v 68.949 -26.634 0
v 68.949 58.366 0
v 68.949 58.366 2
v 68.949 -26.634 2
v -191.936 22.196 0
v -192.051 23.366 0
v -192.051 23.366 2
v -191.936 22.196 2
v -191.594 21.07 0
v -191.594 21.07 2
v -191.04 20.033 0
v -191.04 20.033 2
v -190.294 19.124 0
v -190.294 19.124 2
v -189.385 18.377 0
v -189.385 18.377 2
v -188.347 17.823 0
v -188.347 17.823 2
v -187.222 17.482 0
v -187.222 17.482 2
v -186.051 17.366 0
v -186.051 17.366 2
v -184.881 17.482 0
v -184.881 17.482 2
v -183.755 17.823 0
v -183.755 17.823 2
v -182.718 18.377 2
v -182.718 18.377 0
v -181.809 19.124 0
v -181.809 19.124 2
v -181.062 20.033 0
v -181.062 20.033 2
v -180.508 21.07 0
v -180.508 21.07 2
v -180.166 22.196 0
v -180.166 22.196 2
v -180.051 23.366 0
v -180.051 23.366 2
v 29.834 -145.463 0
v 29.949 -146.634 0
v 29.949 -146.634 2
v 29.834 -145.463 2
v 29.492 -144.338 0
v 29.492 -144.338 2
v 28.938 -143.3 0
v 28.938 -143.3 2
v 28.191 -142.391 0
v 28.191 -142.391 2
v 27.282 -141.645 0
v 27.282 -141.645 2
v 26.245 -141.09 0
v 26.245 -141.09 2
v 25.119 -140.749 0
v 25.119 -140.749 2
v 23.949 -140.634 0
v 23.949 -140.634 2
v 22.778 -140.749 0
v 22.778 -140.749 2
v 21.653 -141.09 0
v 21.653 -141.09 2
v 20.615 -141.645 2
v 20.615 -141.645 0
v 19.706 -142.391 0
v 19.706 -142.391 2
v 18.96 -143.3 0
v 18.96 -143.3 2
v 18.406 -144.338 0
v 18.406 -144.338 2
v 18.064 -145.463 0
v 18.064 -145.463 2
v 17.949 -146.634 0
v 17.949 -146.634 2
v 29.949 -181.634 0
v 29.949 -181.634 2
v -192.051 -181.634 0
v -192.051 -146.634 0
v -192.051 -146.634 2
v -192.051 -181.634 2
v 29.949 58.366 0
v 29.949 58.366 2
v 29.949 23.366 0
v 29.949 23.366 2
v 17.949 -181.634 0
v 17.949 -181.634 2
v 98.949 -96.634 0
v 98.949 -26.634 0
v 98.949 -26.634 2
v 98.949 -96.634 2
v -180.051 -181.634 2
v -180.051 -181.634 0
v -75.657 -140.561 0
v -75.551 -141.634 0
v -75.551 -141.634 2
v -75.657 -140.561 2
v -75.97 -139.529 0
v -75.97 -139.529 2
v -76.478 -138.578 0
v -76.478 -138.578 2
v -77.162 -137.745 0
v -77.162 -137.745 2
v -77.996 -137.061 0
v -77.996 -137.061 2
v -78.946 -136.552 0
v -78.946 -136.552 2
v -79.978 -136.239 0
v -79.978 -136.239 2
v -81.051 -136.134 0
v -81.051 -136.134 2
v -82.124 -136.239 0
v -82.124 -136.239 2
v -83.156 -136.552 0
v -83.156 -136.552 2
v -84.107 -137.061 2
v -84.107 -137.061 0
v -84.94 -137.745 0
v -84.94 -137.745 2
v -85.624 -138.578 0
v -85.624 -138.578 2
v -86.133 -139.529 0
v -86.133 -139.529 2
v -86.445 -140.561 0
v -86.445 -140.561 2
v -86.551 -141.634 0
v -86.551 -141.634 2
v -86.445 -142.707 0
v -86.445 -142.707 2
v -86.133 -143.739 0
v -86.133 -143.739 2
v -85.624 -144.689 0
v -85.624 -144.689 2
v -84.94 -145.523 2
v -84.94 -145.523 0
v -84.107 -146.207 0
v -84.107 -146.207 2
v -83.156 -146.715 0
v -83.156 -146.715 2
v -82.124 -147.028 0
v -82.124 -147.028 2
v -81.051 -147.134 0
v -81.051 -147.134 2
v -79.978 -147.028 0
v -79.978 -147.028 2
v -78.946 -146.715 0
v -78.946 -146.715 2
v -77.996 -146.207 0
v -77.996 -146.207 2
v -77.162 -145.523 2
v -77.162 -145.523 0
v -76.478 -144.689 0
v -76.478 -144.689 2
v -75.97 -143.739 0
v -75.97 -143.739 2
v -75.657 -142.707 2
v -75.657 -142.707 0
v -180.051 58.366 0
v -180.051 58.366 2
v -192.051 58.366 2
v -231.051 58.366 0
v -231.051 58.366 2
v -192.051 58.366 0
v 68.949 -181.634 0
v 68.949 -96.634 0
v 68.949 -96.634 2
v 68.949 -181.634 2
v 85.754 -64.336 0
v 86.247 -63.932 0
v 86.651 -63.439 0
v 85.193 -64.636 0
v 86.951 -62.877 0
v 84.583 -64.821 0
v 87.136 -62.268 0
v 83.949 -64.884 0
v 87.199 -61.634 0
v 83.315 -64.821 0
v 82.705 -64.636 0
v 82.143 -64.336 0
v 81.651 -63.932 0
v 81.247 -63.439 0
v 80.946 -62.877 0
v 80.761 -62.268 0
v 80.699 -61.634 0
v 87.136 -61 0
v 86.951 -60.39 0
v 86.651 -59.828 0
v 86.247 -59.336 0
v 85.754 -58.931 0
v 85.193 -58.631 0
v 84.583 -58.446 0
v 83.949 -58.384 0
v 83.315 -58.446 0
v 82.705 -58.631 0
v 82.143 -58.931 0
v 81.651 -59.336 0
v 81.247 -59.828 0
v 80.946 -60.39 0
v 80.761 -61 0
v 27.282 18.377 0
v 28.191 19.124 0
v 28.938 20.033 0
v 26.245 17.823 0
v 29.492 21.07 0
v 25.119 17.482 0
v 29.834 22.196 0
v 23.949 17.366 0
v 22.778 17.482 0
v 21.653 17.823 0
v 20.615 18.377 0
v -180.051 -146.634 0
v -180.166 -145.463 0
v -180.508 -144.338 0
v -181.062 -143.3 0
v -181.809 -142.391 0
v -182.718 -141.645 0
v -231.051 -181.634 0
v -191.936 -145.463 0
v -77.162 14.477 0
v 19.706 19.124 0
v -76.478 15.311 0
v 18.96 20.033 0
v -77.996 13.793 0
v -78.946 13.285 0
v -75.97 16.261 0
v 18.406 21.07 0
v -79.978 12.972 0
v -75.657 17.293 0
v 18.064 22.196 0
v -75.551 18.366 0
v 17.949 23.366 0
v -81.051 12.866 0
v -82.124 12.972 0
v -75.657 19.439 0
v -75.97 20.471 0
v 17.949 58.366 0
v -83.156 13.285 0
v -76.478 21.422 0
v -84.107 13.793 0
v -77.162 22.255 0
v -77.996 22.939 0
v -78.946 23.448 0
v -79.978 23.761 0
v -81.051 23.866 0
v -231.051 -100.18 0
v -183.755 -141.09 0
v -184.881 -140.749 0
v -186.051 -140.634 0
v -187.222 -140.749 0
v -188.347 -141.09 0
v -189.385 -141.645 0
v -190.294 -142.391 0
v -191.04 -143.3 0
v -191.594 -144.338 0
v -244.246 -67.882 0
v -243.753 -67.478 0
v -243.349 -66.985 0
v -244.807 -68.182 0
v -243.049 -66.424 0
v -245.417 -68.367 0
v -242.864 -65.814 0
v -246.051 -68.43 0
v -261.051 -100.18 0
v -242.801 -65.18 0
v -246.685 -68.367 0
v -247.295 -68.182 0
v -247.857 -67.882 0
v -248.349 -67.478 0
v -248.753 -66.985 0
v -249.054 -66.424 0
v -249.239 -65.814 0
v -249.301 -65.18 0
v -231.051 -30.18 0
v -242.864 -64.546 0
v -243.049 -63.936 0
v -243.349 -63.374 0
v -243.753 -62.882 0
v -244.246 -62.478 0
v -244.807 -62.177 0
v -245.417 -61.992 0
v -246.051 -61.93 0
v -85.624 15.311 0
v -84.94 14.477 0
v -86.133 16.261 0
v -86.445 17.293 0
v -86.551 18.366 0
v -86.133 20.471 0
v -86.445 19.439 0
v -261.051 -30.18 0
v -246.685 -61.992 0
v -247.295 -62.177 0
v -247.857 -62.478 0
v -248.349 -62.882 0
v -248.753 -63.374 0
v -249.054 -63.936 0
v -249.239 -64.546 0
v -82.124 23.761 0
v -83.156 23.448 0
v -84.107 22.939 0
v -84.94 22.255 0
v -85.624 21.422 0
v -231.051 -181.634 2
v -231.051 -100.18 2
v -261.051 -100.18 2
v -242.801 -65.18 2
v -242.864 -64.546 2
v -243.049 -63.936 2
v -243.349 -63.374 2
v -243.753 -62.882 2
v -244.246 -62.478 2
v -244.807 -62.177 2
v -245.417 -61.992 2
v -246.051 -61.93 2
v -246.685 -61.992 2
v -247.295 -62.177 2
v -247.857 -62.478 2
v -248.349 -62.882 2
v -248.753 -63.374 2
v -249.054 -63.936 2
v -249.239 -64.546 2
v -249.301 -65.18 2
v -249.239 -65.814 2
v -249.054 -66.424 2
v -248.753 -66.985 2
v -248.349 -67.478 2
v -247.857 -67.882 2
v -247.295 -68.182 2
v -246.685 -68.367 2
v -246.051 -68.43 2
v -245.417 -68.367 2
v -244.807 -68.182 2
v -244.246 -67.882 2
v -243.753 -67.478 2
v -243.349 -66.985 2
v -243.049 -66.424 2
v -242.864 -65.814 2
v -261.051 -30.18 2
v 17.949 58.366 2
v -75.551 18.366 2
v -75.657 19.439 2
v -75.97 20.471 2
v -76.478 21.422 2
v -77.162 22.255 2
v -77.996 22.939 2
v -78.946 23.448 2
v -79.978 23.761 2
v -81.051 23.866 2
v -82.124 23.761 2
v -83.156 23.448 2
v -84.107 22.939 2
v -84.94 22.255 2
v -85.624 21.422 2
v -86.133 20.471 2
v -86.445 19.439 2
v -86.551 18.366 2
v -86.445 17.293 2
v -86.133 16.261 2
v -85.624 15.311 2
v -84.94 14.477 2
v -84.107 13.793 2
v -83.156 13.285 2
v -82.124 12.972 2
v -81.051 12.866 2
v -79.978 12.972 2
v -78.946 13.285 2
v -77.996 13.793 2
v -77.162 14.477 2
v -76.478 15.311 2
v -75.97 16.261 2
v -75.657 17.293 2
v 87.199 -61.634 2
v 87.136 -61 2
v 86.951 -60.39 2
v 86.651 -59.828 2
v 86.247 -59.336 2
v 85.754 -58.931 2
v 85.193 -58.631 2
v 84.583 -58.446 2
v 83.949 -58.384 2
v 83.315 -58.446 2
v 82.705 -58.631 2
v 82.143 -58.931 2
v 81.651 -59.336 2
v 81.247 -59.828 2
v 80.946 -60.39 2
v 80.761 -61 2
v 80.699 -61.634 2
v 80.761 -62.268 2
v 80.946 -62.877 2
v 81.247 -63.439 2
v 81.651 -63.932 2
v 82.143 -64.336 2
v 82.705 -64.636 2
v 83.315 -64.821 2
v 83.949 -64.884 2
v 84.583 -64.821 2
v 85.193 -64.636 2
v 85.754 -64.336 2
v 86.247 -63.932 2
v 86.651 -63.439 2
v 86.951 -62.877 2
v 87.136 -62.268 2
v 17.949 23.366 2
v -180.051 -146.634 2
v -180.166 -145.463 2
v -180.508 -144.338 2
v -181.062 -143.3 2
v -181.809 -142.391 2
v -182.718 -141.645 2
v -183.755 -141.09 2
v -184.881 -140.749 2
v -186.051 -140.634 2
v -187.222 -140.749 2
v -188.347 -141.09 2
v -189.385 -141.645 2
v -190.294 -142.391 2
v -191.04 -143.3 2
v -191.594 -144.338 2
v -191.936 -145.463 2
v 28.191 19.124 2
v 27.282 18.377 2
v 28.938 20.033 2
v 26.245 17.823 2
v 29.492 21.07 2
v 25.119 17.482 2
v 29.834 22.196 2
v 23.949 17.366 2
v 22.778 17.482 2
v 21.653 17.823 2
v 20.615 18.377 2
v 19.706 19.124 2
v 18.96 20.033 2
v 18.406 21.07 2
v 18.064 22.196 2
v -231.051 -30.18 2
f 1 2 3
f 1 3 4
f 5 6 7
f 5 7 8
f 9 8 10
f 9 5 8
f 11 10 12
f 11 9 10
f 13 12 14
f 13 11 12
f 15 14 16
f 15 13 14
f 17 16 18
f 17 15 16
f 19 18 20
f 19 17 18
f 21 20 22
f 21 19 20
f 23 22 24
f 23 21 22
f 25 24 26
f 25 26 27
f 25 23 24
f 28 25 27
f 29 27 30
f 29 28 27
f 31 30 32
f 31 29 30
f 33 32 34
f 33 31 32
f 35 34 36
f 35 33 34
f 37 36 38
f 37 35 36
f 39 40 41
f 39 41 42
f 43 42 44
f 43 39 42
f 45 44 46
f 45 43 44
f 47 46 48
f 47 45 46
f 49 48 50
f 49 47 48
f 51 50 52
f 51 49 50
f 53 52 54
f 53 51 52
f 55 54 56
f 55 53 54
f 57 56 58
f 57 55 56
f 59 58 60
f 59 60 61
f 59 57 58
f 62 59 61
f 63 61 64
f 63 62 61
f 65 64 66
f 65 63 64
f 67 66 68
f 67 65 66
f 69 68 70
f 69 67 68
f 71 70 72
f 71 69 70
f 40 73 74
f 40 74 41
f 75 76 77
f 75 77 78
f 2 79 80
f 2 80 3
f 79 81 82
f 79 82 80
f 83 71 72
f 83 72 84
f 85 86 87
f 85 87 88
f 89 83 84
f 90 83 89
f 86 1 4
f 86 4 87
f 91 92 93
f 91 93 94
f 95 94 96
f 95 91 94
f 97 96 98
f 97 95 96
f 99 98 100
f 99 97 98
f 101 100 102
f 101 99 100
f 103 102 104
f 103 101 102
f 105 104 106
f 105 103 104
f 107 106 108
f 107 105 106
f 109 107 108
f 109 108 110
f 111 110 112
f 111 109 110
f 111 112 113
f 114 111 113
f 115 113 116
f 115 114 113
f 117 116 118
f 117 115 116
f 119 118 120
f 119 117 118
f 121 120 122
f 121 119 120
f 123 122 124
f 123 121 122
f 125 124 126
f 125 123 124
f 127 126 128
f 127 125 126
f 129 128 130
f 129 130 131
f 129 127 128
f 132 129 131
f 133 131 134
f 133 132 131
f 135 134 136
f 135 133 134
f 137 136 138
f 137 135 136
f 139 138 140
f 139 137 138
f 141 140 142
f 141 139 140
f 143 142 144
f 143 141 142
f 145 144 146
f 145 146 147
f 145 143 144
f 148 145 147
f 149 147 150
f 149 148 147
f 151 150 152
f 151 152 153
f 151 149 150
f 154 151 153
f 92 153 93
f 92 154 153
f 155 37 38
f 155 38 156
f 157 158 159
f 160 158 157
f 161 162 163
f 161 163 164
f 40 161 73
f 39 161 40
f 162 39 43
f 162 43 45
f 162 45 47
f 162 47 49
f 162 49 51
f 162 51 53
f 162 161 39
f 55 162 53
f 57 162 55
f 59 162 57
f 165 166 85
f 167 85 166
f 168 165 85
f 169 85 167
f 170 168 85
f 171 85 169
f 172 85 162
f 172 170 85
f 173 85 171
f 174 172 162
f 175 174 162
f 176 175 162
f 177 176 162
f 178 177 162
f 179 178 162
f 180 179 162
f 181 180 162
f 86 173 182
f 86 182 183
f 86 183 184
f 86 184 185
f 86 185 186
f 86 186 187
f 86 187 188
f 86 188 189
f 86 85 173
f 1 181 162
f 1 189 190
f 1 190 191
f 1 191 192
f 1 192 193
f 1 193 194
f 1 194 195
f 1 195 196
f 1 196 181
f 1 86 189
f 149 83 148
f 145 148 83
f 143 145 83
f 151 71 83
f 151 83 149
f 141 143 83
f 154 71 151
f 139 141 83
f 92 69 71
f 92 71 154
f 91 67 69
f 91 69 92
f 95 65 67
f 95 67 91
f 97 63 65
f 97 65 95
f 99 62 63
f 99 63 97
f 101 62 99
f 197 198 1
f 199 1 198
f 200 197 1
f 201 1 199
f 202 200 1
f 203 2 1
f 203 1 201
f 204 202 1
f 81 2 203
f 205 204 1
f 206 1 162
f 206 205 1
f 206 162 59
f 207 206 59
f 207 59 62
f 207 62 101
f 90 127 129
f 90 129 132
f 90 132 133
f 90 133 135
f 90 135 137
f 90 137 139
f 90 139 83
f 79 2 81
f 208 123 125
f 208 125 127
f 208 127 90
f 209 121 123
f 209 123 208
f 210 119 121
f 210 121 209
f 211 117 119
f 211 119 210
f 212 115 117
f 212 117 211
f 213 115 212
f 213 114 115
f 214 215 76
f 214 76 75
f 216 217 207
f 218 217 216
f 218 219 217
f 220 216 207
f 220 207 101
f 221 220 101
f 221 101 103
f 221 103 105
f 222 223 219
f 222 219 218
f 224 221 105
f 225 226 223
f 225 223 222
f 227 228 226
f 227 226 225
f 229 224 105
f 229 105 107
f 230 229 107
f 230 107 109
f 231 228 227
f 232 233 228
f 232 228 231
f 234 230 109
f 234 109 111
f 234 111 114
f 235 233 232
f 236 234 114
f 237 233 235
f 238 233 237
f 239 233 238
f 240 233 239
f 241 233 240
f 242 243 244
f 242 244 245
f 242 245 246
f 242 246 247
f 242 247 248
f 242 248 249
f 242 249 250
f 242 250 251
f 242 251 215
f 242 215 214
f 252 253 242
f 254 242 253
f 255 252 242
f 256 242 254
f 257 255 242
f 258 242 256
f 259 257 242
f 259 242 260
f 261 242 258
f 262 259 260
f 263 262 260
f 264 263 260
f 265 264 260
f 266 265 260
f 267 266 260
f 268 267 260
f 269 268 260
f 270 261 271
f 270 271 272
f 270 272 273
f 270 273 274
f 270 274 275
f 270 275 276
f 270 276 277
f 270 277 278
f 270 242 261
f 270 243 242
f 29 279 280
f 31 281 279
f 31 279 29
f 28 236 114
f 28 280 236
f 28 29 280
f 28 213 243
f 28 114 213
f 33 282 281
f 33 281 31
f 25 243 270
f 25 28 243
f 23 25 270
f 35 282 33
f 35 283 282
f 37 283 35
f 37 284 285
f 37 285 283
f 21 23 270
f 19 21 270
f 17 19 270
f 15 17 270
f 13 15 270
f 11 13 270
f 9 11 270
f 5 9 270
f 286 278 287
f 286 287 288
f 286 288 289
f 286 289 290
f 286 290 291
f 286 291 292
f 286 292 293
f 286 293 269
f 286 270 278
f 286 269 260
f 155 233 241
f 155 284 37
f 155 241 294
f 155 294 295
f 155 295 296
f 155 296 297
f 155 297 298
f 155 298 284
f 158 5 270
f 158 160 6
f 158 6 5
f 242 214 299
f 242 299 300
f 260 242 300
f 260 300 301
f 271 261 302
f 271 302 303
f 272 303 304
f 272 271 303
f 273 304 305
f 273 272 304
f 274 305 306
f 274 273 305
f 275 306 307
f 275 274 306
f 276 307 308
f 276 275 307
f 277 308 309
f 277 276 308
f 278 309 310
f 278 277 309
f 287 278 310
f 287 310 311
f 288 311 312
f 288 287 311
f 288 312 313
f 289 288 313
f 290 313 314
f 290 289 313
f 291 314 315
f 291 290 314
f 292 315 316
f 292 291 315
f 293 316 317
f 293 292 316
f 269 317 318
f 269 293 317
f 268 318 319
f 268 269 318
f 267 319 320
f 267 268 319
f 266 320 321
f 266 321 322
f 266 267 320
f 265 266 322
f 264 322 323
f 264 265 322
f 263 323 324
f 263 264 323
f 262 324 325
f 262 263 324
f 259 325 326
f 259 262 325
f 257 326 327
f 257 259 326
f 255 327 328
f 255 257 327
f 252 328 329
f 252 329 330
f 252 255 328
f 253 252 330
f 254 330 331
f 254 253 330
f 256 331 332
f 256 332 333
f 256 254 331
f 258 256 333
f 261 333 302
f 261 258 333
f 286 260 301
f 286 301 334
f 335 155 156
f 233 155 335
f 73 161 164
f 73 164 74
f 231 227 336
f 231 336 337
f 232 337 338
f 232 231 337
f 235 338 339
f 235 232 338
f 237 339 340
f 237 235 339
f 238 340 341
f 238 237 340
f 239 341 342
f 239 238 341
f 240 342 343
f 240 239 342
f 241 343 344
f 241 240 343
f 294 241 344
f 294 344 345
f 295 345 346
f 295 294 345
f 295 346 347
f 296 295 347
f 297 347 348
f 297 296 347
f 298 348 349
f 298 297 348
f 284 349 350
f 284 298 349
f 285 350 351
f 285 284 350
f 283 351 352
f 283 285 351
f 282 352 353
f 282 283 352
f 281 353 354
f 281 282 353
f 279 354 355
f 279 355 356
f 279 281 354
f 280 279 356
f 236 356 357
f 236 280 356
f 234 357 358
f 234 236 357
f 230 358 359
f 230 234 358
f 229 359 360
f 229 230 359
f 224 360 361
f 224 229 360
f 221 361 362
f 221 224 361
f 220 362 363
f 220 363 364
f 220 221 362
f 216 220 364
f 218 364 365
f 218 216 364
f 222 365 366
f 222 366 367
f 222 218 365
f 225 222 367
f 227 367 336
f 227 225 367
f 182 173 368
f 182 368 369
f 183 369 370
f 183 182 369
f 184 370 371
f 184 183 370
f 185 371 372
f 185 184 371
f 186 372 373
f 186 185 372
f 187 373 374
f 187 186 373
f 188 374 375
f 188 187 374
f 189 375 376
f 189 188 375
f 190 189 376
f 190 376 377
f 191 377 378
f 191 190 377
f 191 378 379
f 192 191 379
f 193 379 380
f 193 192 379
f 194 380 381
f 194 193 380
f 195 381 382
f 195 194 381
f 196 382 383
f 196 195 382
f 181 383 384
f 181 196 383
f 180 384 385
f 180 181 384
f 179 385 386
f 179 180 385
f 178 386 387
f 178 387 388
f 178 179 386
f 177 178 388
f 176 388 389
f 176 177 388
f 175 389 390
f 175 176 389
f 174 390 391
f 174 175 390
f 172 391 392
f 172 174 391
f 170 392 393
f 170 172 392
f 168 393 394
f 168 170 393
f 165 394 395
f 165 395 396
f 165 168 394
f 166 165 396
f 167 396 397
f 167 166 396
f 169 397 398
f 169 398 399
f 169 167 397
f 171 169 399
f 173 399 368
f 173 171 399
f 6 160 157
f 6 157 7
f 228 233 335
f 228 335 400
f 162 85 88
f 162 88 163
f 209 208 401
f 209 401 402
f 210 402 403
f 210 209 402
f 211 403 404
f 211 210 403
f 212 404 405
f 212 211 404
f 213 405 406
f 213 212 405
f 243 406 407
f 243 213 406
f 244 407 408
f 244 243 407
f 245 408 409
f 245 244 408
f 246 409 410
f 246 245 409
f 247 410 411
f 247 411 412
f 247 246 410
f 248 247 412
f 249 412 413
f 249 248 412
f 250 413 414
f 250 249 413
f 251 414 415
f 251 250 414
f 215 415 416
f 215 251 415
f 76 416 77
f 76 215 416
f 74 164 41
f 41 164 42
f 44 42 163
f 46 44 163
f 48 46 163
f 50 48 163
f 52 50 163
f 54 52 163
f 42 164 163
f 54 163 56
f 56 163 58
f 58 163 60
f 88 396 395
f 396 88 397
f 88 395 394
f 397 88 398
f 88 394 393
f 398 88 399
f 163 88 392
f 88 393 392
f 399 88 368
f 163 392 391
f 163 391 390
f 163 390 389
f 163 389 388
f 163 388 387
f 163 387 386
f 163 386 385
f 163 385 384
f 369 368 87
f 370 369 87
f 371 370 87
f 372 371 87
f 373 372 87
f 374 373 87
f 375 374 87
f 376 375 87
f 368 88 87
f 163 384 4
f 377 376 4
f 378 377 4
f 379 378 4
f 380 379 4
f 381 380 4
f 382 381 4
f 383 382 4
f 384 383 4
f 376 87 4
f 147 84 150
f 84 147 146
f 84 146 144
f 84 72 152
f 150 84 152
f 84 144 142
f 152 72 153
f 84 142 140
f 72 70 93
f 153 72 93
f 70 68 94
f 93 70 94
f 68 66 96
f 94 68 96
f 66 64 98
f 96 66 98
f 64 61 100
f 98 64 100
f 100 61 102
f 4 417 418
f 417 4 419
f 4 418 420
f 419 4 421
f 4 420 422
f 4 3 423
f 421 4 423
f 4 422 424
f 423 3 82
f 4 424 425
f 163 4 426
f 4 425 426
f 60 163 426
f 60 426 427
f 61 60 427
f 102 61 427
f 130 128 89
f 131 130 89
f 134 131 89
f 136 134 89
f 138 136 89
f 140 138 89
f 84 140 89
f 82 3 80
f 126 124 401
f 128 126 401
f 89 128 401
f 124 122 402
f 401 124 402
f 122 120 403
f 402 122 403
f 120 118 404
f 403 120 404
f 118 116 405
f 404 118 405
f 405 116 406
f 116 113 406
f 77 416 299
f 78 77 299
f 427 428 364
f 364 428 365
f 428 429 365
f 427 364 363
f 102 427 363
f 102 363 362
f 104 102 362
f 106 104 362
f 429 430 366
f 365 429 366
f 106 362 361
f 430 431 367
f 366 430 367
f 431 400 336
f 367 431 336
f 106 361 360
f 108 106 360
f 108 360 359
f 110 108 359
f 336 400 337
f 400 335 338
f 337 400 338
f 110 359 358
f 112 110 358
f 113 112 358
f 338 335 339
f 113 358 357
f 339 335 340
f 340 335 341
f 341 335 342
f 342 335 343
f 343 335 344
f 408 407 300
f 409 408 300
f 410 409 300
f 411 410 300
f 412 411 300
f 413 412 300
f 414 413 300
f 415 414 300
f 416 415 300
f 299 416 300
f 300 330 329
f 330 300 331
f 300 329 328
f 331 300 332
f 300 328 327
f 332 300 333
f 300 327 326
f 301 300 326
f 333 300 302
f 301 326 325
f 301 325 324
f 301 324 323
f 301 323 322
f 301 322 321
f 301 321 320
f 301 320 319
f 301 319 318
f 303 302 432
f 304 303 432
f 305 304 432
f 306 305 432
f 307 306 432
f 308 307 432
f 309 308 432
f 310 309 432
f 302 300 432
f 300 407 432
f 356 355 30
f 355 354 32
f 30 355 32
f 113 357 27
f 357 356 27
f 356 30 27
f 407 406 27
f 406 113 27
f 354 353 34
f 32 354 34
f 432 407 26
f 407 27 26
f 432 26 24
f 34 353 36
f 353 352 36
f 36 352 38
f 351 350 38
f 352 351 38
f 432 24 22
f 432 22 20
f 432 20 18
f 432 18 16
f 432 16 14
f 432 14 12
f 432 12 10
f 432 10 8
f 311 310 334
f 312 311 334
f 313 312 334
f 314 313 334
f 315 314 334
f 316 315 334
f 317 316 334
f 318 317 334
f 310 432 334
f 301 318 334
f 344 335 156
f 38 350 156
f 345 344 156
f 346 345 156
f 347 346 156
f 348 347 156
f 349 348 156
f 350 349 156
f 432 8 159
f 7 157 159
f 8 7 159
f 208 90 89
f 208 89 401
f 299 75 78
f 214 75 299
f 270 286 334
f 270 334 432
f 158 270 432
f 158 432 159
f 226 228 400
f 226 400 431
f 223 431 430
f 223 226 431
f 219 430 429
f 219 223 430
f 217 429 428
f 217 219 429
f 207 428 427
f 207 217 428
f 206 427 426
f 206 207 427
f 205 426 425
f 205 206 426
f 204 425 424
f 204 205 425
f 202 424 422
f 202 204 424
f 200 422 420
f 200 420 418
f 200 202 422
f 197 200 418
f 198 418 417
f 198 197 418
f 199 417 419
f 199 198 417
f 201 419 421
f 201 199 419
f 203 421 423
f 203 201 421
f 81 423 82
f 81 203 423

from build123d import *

# Parameters (mm, degrees)
SKETCH1_R           = 5.5
SKETCH1_R_2         = 3.25
BOSS_EXTRUDE1_DEPTH = 2


with BuildPart() as part:
    # Sketch1 → Boss-Extrude1 (new body)
    with BuildSketch(Plane.XY):
        with BuildLine():
            Line((68.948821818, -26.633764286), (98.948821818, -26.633764286))
            Line((98.948821818, -26.633764286), (98.948821818, -96.633764286))
            Line((98.948821818, -96.633764286), (68.948821818, -96.633764286))
            Line((68.948821818, -96.633764286), (68.948821818, -181.633764286))
            Line((68.948821818, -181.633764286), (29.948821818, -181.633764286))
            Line((29.948821818, -181.633764286), (29.948821818, -146.633764286))
            ThreePointArc((29.948821818, -146.633764286), (23.948821818, -140.633764286), (17.948821818, -146.633764286))
            Line((17.948821818, -146.633764286), (17.948821818, -181.633764286))
            Line((17.948821818, -181.633764286), (-180.051178182, -181.633764286))
            Line((-180.051178182, -181.633764286), (-180.051178182, -146.633764286))
            ThreePointArc((-180.051178182, -146.633764286), (-186.051178182, -140.633764286), (-192.051178182, -146.633764286))
            Line((-192.051178182, -146.633764286), (-192.051178182, -181.633764286))
            Line((-192.051178182, -181.633764286), (-231.051178182, -181.633764286))
            Line((-231.051178182, -181.633764286), (-231.051178182, -100.179856115))
            Line((-231.051178182, -100.179856115), (-261.051178182, -100.179856115))
            Line((-261.051178182, -100.179856115), (-261.051178182, -30.179856115))
            Line((-261.051178182, -30.179856115), (-231.051178182, -30.179856115))
            Line((-231.051178182, -30.179856115), (-231.051178182, 58.366235714))
            Line((-231.051178182, 58.366235714), (-192.051178182, 58.366235714))
            Line((-192.051178182, 58.366235714), (-192.051178182, 23.366235714))
            ThreePointArc((-192.051178182, 23.366235714), (-186.051178182, 17.366235714), (-180.051178182, 23.366235714))
            Line((-180.051178182, 23.366235714), (-180.051178182, 58.366235714))
            Line((-180.051178182, 58.366235714), (17.948821818, 58.366235714))
            Line((17.948821818, 58.366235714), (17.948821818, 23.366235714))
            ThreePointArc((17.948821818, 23.366235714), (23.948821818, 17.366235714), (29.948821818, 23.366235714))
            Line((29.948821818, 23.366235714), (29.948821818, 58.366235714))
            Line((29.948821818, 58.366235714), (68.948821818, 58.366235714))
            Line((68.948821818, 58.366235714), (68.948821818, -26.633764286))
        make_face()
        with Locations((-81.051178182, -141.633764286)):
            Circle(SKETCH1_R, mode=Mode.SUBTRACT)
        with Locations((-81.051178182, 18.366235714)):
            Circle(SKETCH1_R, mode=Mode.SUBTRACT)
        with Locations((83.948821818, -61.633764286)):
            Circle(SKETCH1_R_2, mode=Mode.SUBTRACT)
        with Locations((-246.051178182, -65.179856115)):
            Circle(SKETCH1_R_2, mode=Mode.SUBTRACT)
    extrude(amount=BOSS_EXTRUDE1_DEPTH)


solid = part.part
